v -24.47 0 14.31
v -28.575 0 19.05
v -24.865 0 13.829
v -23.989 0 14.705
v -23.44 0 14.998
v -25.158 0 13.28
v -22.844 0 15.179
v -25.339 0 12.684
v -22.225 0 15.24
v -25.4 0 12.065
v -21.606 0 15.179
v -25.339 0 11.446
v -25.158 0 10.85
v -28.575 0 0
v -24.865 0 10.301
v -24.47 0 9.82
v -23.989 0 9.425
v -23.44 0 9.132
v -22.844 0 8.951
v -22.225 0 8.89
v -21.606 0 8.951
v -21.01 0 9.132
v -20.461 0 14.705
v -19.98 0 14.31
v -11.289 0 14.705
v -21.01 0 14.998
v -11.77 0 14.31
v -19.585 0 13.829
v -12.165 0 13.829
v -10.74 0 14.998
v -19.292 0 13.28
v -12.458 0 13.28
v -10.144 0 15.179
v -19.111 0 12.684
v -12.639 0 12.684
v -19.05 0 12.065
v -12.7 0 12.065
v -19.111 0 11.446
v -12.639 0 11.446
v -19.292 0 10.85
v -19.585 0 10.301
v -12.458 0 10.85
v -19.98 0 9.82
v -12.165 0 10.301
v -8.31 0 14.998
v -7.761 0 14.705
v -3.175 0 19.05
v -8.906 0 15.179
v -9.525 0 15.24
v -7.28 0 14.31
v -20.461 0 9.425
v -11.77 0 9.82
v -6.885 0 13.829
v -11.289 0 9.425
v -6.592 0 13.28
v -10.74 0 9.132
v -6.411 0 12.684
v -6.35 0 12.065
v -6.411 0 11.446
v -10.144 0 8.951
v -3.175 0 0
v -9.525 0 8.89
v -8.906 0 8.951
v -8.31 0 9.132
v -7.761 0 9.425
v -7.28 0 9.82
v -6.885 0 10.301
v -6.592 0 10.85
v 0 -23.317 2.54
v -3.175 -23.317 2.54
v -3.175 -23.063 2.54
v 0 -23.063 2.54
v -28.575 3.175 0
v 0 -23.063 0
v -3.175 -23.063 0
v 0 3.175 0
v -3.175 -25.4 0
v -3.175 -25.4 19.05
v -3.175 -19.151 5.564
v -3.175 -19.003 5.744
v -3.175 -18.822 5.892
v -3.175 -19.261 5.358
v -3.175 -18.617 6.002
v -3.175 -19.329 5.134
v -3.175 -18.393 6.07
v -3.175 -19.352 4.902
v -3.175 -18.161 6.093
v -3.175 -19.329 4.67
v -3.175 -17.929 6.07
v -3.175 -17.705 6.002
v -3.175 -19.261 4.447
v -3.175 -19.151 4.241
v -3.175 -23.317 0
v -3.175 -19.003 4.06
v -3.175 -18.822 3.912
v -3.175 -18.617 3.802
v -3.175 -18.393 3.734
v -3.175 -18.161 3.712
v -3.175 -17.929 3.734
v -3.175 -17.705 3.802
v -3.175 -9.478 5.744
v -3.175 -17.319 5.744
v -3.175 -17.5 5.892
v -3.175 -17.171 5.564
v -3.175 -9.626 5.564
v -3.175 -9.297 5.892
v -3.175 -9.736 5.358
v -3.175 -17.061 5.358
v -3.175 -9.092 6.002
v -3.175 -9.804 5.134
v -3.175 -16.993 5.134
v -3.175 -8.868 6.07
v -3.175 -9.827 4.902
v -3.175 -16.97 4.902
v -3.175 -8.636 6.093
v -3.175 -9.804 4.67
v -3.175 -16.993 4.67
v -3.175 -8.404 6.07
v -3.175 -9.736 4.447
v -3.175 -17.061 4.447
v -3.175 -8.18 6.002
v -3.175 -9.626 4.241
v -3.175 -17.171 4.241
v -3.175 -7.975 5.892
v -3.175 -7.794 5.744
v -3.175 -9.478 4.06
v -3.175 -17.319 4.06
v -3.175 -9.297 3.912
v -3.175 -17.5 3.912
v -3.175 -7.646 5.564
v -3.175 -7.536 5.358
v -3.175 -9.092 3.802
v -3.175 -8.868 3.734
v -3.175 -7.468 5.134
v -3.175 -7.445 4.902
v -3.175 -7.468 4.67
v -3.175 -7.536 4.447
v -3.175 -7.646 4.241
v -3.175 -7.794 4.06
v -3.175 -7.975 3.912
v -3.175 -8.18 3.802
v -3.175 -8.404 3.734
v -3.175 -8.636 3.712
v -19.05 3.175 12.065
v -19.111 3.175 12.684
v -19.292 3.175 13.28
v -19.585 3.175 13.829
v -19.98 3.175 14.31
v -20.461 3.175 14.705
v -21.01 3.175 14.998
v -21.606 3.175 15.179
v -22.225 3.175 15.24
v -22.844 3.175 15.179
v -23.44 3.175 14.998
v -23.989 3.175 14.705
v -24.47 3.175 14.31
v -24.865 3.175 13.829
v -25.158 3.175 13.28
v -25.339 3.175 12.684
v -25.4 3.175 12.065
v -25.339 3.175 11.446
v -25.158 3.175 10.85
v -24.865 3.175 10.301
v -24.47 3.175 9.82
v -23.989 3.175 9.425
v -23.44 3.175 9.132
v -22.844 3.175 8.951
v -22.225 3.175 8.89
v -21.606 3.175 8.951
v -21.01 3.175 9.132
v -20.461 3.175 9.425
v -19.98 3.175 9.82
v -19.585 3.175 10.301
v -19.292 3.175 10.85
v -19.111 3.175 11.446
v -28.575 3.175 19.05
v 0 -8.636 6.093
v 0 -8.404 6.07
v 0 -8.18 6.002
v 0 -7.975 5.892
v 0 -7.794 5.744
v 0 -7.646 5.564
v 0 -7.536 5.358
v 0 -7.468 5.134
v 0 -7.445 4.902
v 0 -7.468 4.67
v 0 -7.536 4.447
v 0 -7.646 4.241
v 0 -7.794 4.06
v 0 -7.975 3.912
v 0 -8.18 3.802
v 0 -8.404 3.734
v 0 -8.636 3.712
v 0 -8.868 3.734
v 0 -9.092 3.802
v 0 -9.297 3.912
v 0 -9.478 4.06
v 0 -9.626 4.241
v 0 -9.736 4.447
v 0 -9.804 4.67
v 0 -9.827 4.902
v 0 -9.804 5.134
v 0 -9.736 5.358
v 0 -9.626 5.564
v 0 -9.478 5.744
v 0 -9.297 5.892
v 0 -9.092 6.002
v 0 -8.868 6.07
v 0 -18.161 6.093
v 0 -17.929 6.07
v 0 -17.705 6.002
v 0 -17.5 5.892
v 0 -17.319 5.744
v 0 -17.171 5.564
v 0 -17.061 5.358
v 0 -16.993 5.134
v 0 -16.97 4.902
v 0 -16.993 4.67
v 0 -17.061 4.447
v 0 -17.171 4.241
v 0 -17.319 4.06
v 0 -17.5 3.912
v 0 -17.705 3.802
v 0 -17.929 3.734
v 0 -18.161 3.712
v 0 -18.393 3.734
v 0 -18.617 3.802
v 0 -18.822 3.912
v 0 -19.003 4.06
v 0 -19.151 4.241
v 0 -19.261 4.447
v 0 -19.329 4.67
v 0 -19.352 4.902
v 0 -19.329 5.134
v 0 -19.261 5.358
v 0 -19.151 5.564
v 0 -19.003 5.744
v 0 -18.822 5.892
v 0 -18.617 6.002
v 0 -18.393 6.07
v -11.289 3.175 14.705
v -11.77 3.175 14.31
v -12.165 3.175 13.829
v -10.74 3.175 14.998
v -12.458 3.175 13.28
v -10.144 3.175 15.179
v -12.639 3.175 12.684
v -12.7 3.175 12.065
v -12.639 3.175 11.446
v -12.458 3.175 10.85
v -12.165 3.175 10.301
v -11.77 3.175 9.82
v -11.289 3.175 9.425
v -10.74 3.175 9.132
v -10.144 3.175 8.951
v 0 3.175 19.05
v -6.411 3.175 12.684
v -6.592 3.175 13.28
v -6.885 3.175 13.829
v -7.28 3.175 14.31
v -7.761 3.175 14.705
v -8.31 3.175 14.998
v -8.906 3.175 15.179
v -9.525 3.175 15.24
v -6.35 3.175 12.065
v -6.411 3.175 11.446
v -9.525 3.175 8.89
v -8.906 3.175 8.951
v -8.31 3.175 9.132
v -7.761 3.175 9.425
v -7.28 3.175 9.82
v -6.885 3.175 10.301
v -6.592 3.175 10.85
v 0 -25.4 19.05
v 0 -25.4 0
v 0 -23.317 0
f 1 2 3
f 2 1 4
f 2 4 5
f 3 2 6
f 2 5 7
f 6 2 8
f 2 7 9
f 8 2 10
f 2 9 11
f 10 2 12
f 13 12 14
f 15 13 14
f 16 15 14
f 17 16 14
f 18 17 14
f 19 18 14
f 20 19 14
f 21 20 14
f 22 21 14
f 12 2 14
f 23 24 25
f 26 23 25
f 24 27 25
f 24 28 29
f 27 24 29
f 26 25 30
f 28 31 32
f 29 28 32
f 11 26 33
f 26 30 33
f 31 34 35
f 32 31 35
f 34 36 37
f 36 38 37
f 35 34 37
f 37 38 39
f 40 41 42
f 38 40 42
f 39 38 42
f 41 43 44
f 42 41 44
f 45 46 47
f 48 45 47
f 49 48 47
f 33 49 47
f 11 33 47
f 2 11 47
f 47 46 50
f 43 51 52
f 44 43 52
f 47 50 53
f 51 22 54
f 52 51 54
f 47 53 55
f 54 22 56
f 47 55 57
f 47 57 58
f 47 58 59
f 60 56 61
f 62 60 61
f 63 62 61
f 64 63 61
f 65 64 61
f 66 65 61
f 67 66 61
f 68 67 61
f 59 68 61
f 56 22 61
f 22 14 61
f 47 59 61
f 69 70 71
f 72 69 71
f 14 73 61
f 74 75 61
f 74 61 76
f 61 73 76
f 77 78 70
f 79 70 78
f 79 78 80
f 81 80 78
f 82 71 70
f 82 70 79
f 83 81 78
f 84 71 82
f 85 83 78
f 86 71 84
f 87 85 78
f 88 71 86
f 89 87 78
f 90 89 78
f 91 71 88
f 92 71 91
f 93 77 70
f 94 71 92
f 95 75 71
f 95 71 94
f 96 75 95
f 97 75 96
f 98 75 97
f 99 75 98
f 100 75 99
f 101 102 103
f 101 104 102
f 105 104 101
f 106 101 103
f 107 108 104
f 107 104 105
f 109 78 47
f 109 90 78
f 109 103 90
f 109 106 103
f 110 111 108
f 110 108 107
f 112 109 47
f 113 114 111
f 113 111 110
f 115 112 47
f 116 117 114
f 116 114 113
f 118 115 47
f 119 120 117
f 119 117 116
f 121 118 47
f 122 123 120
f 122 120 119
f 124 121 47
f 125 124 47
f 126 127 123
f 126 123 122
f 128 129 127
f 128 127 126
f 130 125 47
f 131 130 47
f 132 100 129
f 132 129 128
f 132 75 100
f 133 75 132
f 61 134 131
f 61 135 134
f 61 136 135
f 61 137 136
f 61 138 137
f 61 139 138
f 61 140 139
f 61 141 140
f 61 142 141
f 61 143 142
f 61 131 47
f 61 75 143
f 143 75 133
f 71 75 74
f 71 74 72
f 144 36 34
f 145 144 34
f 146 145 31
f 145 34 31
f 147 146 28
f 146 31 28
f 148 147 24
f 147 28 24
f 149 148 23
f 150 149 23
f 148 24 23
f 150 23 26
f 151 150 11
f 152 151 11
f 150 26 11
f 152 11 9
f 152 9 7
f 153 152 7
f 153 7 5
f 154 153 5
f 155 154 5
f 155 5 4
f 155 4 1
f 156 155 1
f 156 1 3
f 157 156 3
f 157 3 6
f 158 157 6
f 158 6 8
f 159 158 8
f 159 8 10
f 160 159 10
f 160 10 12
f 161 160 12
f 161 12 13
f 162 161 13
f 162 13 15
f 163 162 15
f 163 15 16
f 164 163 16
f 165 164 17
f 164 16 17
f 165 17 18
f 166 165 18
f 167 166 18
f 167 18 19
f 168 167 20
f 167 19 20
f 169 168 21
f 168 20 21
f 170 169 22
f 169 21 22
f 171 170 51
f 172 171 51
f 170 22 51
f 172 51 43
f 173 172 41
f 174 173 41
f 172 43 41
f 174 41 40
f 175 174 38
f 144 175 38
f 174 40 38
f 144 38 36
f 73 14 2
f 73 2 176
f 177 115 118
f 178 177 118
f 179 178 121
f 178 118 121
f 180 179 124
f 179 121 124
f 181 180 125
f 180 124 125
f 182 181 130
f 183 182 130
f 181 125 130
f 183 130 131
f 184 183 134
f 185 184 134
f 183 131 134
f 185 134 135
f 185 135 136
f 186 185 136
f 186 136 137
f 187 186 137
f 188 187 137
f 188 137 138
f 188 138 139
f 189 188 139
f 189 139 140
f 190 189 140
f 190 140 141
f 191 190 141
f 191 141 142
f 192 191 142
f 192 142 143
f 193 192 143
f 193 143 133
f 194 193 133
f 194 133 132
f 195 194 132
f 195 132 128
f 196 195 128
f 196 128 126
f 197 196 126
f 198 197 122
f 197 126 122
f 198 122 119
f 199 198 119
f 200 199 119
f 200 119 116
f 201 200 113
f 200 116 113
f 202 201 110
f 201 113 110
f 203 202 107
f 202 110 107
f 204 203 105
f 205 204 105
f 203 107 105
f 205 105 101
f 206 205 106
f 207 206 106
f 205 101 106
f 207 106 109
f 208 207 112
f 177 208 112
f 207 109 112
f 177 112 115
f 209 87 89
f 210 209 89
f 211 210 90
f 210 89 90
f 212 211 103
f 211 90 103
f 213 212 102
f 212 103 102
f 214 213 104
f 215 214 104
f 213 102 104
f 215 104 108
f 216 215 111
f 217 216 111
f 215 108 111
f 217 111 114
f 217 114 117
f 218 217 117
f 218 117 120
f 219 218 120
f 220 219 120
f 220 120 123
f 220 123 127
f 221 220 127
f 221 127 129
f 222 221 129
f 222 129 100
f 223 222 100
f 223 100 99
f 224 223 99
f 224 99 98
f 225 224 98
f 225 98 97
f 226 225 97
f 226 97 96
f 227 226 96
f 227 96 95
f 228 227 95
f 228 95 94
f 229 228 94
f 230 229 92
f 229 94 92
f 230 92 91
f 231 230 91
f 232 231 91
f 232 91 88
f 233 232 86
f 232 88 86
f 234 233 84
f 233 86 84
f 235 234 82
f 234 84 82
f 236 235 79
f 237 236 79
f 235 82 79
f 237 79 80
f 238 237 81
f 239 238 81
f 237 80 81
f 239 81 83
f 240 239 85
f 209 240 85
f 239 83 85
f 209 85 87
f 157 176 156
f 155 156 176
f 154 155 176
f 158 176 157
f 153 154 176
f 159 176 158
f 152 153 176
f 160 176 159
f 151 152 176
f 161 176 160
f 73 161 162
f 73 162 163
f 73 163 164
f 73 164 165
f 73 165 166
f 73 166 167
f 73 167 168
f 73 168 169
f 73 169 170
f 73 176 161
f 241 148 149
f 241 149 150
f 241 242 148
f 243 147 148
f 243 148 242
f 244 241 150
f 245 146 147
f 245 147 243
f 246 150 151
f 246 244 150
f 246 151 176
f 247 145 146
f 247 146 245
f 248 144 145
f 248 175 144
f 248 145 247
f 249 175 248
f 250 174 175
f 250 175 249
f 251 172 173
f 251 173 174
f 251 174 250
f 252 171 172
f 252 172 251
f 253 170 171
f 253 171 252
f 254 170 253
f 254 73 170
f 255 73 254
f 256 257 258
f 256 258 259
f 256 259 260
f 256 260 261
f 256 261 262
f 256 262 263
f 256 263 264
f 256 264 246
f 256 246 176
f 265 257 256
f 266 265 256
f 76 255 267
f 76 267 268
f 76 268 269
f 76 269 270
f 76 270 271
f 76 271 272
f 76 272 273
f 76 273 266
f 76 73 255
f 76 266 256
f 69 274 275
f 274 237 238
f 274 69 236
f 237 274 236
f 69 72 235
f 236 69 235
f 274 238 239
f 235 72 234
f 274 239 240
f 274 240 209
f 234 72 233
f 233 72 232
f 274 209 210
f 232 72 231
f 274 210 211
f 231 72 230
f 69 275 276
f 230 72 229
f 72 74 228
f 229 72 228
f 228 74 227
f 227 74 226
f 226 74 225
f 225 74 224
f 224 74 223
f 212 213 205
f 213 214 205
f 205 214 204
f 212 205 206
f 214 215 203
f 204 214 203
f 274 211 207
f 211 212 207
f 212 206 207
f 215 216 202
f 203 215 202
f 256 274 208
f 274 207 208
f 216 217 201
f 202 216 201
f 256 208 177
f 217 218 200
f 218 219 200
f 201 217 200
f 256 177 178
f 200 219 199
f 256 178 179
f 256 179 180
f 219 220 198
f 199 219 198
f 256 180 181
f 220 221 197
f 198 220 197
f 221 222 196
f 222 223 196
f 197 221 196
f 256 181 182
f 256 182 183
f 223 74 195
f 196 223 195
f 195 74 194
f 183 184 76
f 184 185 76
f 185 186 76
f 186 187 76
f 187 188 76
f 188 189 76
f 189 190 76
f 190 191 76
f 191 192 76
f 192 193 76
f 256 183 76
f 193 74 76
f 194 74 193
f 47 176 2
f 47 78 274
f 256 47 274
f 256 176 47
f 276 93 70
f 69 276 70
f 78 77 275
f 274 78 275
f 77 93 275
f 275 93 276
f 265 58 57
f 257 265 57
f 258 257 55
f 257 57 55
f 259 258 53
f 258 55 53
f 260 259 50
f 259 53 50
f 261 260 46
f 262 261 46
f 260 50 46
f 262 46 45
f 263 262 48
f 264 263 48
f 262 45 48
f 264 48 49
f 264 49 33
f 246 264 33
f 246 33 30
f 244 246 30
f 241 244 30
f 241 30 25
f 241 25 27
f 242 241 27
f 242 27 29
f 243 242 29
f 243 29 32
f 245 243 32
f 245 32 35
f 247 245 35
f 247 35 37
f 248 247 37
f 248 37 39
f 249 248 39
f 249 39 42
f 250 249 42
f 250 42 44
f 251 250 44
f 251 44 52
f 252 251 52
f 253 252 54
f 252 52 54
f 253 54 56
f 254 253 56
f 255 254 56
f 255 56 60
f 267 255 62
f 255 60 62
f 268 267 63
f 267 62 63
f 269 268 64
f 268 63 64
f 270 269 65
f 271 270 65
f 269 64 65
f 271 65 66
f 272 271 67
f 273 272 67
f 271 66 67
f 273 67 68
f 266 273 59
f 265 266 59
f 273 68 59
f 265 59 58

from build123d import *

# Parameters (mm, degrees)
SKETCH1_W           = 28.575
SKETCH1_H           = 3.175
SKETCH1_W_2         = 3.175
SKETCH1_H_2         = 25.4
BOSS_EXTRUDE1_DEPTH = 19.05
SWITCH_MOUNT_REACH  = 5.175
SKETCH2_R           = 1.190625
SKETCH2_W           = 2.54
SKETCH2_H           = 0.254
BRACKET_MOUNT_REACH = 5.175
SKETCH3_R           = 3.175


with BuildPart() as part:
    # Sketch1 → Boss-Extrude1 (new body)
    with BuildSketch(Plane.XY):
        with Locations((-14.2875, 1.5875)):
            Rectangle(SKETCH1_W, SKETCH1_H)
        with Locations((-1.5875, -12.7)):
            Rectangle(SKETCH1_W_2, SKETCH1_H_2)
    extrude(amount=BOSS_EXTRUDE1_DEPTH)

    # Sketch2 → Switch Mount (cut, up to next)
    with BuildSketch(Plane.ZY.offset(3.175), mode=Mode.PRIVATE) as switch_mount_sk1:
        with Locations((4.9022, -8.636)):
            Circle(SKETCH2_R)
    switch_mount_tool1 = extrude(switch_mount_sk1.sketch, amount=-SWITCH_MOUNT_REACH, mode=Mode.PRIVATE) & part.part
    add(switch_mount_tool1.solids().sort_by_distance((-3.175, -8.636, 4.9022))[0], mode=Mode.SUBTRACT)
    # Sketch2 → Switch Mount (cut, up to next)
    with BuildSketch(Plane.ZY.offset(3.175), mode=Mode.PRIVATE) as switch_mount_sk2:
        with Locations((4.9022, -18.161)):
            Circle(SKETCH2_R)
    switch_mount_tool2 = extrude(switch_mount_sk2.sketch, amount=-SWITCH_MOUNT_REACH, mode=Mode.PRIVATE) & part.part
    add(switch_mount_tool2.solids().sort_by_distance((-3.175, -18.161, 4.9022))[0], mode=Mode.SUBTRACT)
    # Sketch2 → Switch Mount (cut, up to next)
    with BuildSketch(Plane.ZY.offset(3.175), mode=Mode.PRIVATE) as switch_mount_sk3:
        with Locations((1.27, -23.1902)):
            Rectangle(SKETCH2_W, SKETCH2_H)
    switch_mount_tool3 = extrude(switch_mount_sk3.sketch, amount=-SWITCH_MOUNT_REACH, mode=Mode.PRIVATE) & part.part
    add(switch_mount_tool3.solids().sort_by_distance((-3.175, -23.1902, 1.27))[0], mode=Mode.SUBTRACT)

    # Sketch3 → Bracket Mount (cut, up to next)
    with BuildSketch(Plane.XZ, mode=Mode.PRIVATE) as bracket_mount_sk1:
        with Locations((-9.525, 12.065)):
            Circle(SKETCH3_R)
    bracket_mount_tool1 = extrude(bracket_mount_sk1.sketch, amount=-BRACKET_MOUNT_REACH, mode=Mode.PRIVATE) & part.part
    add(bracket_mount_tool1.solids().sort_by_distance((-9.525, 0, 12.065))[0], mode=Mode.SUBTRACT)
    # Sketch3 → Bracket Mount (cut, up to next)
    with BuildSketch(Plane.XZ, mode=Mode.PRIVATE) as bracket_mount_sk2:
        with Locations((-22.225, 12.065)):
            Circle(SKETCH3_R)
    bracket_mount_tool2 = extrude(bracket_mount_sk2.sketch, amount=-BRACKET_MOUNT_REACH, mode=Mode.PRIVATE) & part.part
    add(bracket_mount_tool2.solids().sort_by_distance((-22.225, 0, 12.065))[0], mode=Mode.SUBTRACT)


solid = part.part
